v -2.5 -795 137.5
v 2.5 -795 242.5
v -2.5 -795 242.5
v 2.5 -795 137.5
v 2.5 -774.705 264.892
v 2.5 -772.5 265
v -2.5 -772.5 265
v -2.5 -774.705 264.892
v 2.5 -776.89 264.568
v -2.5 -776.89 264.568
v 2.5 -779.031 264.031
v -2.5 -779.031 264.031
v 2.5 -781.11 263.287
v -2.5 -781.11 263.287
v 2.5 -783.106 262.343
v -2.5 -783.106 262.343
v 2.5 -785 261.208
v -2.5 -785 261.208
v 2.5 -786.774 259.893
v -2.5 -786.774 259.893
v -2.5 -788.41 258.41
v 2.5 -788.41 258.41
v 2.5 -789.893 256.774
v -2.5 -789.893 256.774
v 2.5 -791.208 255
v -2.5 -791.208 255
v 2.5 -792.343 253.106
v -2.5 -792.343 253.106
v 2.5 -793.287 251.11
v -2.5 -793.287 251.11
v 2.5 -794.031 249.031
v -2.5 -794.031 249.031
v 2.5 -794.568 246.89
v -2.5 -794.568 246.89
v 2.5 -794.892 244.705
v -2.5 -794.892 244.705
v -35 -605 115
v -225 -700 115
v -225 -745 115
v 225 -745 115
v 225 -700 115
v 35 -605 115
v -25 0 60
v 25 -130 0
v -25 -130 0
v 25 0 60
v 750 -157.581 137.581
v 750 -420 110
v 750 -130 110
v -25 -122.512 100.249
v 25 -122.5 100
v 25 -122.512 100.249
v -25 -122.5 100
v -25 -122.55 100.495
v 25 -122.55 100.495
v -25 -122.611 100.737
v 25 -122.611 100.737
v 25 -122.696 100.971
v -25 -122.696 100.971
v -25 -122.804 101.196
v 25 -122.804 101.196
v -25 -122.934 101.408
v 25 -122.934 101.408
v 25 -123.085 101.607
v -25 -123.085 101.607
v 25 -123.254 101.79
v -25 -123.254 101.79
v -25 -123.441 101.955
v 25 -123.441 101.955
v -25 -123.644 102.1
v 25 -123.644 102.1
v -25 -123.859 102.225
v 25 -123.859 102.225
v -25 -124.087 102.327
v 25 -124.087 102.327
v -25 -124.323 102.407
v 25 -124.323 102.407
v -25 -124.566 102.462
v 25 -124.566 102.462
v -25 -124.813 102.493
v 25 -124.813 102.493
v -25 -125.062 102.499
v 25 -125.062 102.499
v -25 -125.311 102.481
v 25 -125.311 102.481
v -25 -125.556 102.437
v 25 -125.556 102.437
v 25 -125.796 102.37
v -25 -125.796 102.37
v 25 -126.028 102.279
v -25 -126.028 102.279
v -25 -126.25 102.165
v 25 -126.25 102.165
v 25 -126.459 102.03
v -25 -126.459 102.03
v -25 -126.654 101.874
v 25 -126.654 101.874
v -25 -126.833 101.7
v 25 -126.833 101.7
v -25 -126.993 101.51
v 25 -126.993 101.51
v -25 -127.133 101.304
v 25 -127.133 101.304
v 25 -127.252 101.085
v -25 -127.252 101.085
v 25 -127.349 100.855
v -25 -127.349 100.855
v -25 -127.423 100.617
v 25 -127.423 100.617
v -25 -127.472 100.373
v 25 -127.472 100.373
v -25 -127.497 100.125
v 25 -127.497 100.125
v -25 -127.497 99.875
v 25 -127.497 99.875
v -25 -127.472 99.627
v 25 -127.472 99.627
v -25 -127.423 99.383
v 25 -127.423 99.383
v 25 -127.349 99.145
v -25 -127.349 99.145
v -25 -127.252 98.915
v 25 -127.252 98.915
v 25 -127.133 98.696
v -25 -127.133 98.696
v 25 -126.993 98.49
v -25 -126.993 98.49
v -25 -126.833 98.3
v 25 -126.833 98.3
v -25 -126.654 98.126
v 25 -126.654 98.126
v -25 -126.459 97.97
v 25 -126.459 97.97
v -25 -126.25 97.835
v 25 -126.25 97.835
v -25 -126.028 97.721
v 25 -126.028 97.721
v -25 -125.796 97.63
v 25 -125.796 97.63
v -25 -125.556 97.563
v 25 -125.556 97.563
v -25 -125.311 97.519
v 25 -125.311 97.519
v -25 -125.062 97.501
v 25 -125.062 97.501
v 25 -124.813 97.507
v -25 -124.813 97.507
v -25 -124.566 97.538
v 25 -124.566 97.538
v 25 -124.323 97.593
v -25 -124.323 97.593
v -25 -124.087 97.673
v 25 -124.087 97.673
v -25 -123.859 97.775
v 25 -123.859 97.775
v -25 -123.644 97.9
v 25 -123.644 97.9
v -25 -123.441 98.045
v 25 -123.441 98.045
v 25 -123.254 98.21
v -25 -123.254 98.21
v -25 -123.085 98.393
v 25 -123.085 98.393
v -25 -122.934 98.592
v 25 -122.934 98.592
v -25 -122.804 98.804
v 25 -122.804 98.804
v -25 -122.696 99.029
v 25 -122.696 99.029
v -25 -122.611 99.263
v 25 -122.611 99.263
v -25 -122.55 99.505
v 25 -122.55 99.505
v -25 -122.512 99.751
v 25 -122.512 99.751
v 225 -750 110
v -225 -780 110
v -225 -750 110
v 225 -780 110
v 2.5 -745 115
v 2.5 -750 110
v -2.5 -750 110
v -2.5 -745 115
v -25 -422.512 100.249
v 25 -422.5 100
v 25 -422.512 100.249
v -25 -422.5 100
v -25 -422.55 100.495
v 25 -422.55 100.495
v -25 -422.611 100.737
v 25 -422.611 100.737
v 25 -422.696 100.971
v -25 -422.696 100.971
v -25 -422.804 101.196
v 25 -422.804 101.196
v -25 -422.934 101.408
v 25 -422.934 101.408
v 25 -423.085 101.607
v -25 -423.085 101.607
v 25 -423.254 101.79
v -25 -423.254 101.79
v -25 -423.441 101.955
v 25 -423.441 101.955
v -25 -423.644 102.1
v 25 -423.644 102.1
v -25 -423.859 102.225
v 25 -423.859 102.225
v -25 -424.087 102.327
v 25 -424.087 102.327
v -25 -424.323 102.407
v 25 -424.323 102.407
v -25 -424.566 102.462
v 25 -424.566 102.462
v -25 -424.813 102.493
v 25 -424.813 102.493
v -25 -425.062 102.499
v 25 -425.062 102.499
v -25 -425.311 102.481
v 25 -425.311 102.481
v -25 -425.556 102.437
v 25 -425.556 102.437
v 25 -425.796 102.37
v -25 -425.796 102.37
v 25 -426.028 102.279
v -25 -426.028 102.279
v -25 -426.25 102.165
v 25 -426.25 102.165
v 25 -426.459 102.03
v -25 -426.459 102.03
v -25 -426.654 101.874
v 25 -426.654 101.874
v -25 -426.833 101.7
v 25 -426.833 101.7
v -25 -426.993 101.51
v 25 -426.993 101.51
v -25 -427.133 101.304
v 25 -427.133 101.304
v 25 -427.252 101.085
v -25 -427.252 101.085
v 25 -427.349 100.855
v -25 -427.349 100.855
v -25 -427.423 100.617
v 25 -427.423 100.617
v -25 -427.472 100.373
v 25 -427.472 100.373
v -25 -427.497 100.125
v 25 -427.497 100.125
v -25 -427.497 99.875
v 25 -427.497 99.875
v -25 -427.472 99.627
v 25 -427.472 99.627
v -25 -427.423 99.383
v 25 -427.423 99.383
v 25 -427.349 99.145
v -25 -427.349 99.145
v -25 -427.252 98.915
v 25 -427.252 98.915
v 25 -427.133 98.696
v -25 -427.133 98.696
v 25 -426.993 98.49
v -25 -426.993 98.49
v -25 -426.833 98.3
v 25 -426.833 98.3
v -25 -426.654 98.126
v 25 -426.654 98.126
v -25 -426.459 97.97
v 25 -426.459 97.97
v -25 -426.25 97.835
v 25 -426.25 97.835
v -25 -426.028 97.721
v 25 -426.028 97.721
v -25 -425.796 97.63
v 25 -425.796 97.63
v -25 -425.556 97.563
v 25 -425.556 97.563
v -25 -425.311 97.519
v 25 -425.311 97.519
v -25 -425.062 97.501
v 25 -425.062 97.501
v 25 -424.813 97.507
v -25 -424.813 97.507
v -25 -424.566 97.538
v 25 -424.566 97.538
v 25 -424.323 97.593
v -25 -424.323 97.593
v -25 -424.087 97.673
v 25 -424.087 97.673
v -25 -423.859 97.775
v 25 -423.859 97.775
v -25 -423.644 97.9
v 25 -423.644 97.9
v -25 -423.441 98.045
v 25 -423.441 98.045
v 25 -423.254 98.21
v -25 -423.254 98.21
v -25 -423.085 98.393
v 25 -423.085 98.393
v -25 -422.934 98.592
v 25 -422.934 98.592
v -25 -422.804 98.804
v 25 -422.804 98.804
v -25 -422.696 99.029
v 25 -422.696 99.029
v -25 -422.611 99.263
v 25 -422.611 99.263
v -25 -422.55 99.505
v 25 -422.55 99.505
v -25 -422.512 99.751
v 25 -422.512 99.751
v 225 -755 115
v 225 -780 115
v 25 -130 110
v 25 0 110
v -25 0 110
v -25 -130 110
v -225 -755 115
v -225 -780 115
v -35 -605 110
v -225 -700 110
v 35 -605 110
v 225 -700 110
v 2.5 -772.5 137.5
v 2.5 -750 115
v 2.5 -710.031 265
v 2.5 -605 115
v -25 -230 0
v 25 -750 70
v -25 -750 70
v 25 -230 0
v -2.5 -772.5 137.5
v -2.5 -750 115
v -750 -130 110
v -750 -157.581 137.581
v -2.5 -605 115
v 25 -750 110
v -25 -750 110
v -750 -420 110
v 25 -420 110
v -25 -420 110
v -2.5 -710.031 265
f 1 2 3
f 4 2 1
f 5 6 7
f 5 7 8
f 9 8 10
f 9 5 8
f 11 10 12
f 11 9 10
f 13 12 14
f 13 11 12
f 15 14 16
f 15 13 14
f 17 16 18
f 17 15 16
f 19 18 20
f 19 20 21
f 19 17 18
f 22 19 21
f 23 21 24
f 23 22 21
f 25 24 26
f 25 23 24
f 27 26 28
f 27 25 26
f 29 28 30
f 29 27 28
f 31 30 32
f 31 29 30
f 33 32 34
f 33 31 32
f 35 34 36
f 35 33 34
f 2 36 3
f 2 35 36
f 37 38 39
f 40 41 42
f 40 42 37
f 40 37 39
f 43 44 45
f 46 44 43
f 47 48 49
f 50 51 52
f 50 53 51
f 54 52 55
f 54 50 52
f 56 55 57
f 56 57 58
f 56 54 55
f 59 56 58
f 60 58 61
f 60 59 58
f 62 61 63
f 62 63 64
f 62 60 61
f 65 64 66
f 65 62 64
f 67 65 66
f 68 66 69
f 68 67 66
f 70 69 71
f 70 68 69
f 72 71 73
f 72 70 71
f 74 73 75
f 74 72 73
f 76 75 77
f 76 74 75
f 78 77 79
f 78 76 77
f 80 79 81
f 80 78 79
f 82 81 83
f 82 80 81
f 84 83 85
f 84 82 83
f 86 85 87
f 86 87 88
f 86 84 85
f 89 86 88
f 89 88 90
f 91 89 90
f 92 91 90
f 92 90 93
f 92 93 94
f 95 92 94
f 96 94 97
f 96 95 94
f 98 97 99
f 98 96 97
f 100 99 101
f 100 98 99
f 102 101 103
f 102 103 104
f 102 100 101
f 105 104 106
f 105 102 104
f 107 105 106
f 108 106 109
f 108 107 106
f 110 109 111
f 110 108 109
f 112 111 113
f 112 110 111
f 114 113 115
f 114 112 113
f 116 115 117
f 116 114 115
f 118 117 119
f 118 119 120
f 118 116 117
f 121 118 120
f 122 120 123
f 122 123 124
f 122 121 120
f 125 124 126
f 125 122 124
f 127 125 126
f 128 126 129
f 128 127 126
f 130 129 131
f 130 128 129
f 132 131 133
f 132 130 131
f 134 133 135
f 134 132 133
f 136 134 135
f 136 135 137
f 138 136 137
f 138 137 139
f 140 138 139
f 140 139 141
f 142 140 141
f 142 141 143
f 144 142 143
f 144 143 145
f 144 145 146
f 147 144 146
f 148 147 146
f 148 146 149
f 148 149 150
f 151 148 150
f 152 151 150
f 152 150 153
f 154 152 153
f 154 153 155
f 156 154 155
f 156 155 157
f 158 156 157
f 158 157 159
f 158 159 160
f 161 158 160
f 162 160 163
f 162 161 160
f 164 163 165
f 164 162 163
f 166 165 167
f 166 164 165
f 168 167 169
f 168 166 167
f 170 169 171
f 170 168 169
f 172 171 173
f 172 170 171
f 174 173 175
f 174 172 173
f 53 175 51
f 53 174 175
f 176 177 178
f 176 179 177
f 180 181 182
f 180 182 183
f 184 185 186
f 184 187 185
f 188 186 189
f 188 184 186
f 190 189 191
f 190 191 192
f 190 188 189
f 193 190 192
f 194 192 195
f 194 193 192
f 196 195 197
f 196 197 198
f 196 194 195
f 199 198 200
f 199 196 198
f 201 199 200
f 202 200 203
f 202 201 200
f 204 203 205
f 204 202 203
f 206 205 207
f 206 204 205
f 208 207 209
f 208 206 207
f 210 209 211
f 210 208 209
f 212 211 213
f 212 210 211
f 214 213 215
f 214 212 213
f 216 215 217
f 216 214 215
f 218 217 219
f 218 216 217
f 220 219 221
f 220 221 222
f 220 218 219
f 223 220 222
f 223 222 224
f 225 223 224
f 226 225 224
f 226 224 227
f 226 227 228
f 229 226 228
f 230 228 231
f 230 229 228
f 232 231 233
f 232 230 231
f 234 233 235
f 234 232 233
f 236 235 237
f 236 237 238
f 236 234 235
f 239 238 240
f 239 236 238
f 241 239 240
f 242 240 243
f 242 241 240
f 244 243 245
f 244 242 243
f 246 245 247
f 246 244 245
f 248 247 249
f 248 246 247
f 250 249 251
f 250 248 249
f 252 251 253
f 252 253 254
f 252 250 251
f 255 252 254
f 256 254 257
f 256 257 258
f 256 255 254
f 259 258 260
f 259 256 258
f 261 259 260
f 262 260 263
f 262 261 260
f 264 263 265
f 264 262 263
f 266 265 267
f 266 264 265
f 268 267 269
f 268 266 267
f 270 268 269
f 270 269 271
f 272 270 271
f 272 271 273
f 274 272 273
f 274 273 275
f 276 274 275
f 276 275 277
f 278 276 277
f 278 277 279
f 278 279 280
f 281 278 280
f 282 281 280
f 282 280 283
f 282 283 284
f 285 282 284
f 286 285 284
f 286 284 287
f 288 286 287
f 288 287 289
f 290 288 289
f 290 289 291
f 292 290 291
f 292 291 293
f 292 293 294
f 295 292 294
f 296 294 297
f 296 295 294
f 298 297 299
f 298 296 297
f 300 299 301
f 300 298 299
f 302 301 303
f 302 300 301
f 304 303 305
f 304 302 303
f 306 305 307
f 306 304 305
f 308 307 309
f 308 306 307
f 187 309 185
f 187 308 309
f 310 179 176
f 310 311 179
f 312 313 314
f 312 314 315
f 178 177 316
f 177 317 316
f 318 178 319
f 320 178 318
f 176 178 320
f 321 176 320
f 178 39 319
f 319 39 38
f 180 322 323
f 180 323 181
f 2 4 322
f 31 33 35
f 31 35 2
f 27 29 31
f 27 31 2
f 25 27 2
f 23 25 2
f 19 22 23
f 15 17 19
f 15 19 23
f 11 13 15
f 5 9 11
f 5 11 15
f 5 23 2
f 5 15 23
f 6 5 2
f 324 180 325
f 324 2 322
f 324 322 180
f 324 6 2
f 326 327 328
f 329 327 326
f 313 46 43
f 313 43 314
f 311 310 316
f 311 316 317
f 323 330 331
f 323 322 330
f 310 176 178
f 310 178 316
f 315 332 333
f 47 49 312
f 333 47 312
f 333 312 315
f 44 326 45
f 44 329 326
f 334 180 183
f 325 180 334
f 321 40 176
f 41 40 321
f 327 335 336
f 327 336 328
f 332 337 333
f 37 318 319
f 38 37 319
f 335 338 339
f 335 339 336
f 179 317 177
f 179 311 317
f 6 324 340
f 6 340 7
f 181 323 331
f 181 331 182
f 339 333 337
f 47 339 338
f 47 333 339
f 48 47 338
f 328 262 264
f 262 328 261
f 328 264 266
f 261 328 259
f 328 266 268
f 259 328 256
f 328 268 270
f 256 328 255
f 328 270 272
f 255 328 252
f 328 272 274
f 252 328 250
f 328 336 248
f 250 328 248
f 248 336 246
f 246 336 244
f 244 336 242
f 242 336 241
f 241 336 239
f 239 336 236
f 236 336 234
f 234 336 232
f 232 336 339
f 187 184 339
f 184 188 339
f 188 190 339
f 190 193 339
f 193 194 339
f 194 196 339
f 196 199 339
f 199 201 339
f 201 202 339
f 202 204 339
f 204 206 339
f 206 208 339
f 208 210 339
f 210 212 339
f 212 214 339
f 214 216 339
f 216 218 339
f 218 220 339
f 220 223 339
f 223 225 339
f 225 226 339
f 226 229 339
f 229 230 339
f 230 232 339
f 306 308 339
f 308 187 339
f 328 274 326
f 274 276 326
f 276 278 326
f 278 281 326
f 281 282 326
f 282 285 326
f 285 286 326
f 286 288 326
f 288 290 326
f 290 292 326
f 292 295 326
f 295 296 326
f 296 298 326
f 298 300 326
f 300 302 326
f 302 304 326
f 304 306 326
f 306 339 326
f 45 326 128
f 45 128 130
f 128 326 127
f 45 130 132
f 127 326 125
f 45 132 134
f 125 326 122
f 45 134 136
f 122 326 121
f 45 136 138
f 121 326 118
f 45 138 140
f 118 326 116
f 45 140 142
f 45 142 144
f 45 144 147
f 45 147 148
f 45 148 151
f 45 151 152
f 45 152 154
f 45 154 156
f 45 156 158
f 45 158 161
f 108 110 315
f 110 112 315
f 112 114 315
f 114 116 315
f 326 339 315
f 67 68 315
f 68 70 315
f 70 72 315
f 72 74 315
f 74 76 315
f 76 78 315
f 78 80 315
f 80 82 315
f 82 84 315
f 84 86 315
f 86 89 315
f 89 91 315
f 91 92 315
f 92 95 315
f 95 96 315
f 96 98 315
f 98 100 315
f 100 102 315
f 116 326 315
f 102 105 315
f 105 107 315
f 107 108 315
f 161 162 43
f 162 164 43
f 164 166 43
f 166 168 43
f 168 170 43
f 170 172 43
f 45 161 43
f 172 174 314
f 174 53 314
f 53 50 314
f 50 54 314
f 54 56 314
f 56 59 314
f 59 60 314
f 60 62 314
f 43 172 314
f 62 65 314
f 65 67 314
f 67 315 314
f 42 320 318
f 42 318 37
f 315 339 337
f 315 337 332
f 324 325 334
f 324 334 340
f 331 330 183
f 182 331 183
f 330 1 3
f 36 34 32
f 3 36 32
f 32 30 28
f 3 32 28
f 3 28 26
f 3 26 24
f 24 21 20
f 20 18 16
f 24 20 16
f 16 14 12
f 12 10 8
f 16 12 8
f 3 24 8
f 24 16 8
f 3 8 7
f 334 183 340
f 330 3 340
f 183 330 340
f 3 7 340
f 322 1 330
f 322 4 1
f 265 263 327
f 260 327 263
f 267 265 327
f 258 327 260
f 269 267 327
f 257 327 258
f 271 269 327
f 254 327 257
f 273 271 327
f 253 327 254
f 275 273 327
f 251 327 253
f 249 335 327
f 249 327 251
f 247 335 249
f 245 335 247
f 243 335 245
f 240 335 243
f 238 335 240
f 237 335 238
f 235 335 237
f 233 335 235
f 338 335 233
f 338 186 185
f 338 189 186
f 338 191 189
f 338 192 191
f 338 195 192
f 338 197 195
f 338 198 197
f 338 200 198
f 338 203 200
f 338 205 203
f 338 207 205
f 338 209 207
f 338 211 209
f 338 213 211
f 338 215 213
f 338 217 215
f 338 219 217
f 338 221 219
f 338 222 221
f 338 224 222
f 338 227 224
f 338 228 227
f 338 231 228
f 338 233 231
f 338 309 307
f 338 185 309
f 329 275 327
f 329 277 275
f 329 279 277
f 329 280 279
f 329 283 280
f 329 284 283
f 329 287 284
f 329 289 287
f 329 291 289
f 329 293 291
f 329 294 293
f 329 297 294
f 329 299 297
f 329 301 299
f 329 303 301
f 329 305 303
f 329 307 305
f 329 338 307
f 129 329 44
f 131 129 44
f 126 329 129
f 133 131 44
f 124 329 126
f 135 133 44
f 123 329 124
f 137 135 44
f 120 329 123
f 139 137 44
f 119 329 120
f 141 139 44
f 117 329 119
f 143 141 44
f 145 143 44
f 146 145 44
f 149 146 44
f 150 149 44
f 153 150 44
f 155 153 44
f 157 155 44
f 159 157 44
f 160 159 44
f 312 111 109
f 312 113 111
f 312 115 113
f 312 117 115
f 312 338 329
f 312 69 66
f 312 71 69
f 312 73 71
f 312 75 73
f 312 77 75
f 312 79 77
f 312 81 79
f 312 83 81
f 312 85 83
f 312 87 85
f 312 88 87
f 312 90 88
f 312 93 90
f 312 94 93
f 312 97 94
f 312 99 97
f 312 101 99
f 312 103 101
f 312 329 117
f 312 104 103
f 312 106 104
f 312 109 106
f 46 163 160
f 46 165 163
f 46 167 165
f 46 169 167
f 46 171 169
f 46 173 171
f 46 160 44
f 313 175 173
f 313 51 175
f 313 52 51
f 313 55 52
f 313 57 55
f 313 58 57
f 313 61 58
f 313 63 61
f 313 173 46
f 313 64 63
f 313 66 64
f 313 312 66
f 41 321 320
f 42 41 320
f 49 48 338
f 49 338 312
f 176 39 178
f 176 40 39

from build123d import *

# Parameters (mm, degrees)
F1_DEPTH = 2.5
F0_R     = 2.5
F2_DEPTH = 25
F3_DEPTH = 225
F5_DEPTH = 25
F6_DEPTH = 750


with BuildPart() as f1:
    # F0 (on Right) → F1 (new body, symmetric)
    with BuildSketch(Plane.YZ):
        with BuildLine():
            Line((-772.5, 137.5), (-750, 115))
            Line((-750, 115), (-750, 265))
            Line((-750, 265), (-772.5, 265))
            ThreePointArc((-772.5, 265), (-788.4099025767, 258.4099025767), (-795, 242.5))
            Line((-795, 242.5), (-795, 137.5))
            Line((-795, 137.5), (-772.5, 137.5))
        make_face()
        Polygon((-750, 115), (-750, 110), (-745, 115), (-605, 115), (-710.0311307315, 265), (-750, 265), align=None)
    extrude(amount=F1_DEPTH, both=True)


with BuildPart() as f2:
    # F0 (on Right) → F2 (new body, symmetric)
    with BuildSketch(Plane.YZ):
        Polygon((-180, 0), (-130, 0), (0, 60), (0, 110), (-130, 110), (-420, 110), (-605, 110), (-750, 110), (-750, 70), (-230, 0), align=None)
        with Locations((-425, 100)):
            Circle(F0_R, mode=Mode.SUBTRACT)
        with Locations((-125, 100)):
            Circle(F0_R, mode=Mode.SUBTRACT)
    extrude(amount=F2_DEPTH, both=True)

    # F0 (on Right) → F6 (join, symmetric)
    with BuildSketch(Plane.YZ):
        Polygon((-420, 110), (-130, 110), (-157.5813151867, 137.5813151867), align=None)
    extrude(amount=F6_DEPTH, both=True)


with BuildPart() as f3:
    # F0 (on Right) → F3 (new body, symmetric)
    with BuildSketch(Plane.YZ):
        Polygon((-780, 110), (-750, 110), (-755, 115), (-780, 115), align=None)
    extrude(amount=F3_DEPTH, both=True)


with BuildPart() as f3b:
    # F0 (on Right) → F3, piece 2 (new body, symmetric)
    with BuildSketch(Plane.YZ):
        Polygon((-745, 115), (-750, 110), (-605, 110), (-605, 115), align=None)
    extrude(amount=F3_DEPTH, both=True)

    # F4 (on face) → F5 (cut)
    with BuildSketch(Plane(origin=(0, 0, 110), x_dir=(1, 0, 0), z_dir=(0, 0, -1))):
        Polygon((225, 605), (225, 700), (35, 605), align=None)
        Polygon((-35, 605), (-225, 700), (-225, 605), align=None)
    extrude(amount=-F5_DEPTH, mode=Mode.SUBTRACT)


solid = Compound([f1.part, f2.part, f3.part, f3b.part])
